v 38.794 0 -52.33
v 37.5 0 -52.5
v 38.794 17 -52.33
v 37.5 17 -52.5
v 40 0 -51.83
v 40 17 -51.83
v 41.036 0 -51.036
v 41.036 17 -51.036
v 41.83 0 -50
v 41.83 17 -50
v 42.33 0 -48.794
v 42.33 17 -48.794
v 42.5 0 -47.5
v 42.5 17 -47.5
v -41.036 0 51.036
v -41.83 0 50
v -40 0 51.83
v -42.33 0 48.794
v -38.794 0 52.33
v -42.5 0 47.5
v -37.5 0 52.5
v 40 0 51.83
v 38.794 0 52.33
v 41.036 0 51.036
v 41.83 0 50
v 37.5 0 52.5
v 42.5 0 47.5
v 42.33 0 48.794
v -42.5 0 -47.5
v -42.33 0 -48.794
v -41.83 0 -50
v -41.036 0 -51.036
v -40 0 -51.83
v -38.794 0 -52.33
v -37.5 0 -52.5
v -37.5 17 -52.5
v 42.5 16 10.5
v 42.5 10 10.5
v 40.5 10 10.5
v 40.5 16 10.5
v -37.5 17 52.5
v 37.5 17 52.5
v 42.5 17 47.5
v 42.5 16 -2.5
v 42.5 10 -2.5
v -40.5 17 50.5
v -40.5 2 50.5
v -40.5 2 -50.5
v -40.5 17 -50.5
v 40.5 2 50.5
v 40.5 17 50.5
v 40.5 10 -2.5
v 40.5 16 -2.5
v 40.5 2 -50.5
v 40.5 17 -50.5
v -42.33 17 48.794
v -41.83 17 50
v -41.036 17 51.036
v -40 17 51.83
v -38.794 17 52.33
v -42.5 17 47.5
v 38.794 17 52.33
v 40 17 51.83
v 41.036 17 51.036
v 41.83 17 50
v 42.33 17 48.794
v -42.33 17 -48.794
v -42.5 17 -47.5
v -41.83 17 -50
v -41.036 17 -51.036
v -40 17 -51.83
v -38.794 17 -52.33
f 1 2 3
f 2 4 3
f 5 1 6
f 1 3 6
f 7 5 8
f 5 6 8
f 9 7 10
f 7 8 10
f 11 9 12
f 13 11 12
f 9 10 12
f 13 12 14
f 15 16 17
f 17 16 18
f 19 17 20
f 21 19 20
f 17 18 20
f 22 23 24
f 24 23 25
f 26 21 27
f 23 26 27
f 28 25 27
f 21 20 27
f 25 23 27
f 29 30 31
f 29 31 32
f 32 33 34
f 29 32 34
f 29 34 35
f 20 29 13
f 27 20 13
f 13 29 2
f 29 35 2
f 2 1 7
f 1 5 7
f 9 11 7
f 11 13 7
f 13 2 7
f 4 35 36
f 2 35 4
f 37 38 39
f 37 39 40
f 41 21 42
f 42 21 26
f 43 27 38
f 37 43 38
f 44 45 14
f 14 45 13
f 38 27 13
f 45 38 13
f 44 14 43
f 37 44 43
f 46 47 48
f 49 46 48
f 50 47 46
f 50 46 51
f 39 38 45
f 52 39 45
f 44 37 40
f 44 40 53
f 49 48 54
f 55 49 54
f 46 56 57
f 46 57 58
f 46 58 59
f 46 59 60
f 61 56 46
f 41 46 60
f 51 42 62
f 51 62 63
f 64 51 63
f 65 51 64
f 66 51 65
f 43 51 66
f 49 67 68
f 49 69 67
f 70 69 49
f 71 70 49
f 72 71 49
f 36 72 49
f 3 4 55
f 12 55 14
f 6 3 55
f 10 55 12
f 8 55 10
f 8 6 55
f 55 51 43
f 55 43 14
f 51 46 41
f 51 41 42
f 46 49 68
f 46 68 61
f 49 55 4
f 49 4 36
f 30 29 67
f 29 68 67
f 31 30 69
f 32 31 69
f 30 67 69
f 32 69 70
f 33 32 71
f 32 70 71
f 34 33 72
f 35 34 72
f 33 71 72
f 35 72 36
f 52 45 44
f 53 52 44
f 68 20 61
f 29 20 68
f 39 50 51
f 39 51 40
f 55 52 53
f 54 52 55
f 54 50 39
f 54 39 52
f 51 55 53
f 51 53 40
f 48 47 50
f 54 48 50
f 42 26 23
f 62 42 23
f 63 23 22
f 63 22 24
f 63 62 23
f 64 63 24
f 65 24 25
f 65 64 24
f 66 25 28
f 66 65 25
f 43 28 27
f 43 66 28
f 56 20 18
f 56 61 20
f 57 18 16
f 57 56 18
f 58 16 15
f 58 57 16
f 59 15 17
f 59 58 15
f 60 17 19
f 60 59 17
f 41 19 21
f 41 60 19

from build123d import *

# Parameters (mm, degrees)
SKETCH1_W           = 85
SKETCH1_H           = 105
BOSS_EXTRUDE1_DEPTH = 17
SHELL1_T            = -2
SKETCH3_W           = 13
SKETCH3_H           = 6
CUT_EXTRUDE1_DEPTH  = 10
FILLET1_R           = 5


with BuildPart() as part:
    # Sketch1 → Boss-Extrude1 (new body)
    with BuildSketch(Plane(origin=(0, 0, 0), x_dir=(1, 0, 0), z_dir=(0, 1, 0))):
        Rectangle(SKETCH1_W, SKETCH1_H)
    extrude(amount=BOSS_EXTRUDE1_DEPTH)

    # Shell1
    shell1_openings = [part.faces().sort_by_distance(p)[0] for p in [
        (0, 17, 0),
    ]]
    offset(amount=SHELL1_T, openings=shell1_openings, kind=Kind.INTERSECTION)

    # Sketch3 → Cut-Extrude1 (cut)
    with BuildSketch(Plane(origin=(42.5, 0, 0), x_dir=(0, 0, -1), z_dir=(1, 0, 0))):
        with Locations((-4, 13)):
            Rectangle(SKETCH3_W, SKETCH3_H)
    extrude(amount=-CUT_EXTRUDE1_DEPTH, mode=Mode.SUBTRACT)

    # Fillet1
    fillet1_edges = [part.edges().sort_by_distance(p)[0] for p in [
        (42.5, 8.5, 52.5),
        (-42.5, 8.5, 52.5),
        (-42.5, 8.5, -52.5),
        (42.5, 8.5, -52.5),
    ]]
    fillet(fillet1_edges, radius=FILLET1_R)


solid = part.part
